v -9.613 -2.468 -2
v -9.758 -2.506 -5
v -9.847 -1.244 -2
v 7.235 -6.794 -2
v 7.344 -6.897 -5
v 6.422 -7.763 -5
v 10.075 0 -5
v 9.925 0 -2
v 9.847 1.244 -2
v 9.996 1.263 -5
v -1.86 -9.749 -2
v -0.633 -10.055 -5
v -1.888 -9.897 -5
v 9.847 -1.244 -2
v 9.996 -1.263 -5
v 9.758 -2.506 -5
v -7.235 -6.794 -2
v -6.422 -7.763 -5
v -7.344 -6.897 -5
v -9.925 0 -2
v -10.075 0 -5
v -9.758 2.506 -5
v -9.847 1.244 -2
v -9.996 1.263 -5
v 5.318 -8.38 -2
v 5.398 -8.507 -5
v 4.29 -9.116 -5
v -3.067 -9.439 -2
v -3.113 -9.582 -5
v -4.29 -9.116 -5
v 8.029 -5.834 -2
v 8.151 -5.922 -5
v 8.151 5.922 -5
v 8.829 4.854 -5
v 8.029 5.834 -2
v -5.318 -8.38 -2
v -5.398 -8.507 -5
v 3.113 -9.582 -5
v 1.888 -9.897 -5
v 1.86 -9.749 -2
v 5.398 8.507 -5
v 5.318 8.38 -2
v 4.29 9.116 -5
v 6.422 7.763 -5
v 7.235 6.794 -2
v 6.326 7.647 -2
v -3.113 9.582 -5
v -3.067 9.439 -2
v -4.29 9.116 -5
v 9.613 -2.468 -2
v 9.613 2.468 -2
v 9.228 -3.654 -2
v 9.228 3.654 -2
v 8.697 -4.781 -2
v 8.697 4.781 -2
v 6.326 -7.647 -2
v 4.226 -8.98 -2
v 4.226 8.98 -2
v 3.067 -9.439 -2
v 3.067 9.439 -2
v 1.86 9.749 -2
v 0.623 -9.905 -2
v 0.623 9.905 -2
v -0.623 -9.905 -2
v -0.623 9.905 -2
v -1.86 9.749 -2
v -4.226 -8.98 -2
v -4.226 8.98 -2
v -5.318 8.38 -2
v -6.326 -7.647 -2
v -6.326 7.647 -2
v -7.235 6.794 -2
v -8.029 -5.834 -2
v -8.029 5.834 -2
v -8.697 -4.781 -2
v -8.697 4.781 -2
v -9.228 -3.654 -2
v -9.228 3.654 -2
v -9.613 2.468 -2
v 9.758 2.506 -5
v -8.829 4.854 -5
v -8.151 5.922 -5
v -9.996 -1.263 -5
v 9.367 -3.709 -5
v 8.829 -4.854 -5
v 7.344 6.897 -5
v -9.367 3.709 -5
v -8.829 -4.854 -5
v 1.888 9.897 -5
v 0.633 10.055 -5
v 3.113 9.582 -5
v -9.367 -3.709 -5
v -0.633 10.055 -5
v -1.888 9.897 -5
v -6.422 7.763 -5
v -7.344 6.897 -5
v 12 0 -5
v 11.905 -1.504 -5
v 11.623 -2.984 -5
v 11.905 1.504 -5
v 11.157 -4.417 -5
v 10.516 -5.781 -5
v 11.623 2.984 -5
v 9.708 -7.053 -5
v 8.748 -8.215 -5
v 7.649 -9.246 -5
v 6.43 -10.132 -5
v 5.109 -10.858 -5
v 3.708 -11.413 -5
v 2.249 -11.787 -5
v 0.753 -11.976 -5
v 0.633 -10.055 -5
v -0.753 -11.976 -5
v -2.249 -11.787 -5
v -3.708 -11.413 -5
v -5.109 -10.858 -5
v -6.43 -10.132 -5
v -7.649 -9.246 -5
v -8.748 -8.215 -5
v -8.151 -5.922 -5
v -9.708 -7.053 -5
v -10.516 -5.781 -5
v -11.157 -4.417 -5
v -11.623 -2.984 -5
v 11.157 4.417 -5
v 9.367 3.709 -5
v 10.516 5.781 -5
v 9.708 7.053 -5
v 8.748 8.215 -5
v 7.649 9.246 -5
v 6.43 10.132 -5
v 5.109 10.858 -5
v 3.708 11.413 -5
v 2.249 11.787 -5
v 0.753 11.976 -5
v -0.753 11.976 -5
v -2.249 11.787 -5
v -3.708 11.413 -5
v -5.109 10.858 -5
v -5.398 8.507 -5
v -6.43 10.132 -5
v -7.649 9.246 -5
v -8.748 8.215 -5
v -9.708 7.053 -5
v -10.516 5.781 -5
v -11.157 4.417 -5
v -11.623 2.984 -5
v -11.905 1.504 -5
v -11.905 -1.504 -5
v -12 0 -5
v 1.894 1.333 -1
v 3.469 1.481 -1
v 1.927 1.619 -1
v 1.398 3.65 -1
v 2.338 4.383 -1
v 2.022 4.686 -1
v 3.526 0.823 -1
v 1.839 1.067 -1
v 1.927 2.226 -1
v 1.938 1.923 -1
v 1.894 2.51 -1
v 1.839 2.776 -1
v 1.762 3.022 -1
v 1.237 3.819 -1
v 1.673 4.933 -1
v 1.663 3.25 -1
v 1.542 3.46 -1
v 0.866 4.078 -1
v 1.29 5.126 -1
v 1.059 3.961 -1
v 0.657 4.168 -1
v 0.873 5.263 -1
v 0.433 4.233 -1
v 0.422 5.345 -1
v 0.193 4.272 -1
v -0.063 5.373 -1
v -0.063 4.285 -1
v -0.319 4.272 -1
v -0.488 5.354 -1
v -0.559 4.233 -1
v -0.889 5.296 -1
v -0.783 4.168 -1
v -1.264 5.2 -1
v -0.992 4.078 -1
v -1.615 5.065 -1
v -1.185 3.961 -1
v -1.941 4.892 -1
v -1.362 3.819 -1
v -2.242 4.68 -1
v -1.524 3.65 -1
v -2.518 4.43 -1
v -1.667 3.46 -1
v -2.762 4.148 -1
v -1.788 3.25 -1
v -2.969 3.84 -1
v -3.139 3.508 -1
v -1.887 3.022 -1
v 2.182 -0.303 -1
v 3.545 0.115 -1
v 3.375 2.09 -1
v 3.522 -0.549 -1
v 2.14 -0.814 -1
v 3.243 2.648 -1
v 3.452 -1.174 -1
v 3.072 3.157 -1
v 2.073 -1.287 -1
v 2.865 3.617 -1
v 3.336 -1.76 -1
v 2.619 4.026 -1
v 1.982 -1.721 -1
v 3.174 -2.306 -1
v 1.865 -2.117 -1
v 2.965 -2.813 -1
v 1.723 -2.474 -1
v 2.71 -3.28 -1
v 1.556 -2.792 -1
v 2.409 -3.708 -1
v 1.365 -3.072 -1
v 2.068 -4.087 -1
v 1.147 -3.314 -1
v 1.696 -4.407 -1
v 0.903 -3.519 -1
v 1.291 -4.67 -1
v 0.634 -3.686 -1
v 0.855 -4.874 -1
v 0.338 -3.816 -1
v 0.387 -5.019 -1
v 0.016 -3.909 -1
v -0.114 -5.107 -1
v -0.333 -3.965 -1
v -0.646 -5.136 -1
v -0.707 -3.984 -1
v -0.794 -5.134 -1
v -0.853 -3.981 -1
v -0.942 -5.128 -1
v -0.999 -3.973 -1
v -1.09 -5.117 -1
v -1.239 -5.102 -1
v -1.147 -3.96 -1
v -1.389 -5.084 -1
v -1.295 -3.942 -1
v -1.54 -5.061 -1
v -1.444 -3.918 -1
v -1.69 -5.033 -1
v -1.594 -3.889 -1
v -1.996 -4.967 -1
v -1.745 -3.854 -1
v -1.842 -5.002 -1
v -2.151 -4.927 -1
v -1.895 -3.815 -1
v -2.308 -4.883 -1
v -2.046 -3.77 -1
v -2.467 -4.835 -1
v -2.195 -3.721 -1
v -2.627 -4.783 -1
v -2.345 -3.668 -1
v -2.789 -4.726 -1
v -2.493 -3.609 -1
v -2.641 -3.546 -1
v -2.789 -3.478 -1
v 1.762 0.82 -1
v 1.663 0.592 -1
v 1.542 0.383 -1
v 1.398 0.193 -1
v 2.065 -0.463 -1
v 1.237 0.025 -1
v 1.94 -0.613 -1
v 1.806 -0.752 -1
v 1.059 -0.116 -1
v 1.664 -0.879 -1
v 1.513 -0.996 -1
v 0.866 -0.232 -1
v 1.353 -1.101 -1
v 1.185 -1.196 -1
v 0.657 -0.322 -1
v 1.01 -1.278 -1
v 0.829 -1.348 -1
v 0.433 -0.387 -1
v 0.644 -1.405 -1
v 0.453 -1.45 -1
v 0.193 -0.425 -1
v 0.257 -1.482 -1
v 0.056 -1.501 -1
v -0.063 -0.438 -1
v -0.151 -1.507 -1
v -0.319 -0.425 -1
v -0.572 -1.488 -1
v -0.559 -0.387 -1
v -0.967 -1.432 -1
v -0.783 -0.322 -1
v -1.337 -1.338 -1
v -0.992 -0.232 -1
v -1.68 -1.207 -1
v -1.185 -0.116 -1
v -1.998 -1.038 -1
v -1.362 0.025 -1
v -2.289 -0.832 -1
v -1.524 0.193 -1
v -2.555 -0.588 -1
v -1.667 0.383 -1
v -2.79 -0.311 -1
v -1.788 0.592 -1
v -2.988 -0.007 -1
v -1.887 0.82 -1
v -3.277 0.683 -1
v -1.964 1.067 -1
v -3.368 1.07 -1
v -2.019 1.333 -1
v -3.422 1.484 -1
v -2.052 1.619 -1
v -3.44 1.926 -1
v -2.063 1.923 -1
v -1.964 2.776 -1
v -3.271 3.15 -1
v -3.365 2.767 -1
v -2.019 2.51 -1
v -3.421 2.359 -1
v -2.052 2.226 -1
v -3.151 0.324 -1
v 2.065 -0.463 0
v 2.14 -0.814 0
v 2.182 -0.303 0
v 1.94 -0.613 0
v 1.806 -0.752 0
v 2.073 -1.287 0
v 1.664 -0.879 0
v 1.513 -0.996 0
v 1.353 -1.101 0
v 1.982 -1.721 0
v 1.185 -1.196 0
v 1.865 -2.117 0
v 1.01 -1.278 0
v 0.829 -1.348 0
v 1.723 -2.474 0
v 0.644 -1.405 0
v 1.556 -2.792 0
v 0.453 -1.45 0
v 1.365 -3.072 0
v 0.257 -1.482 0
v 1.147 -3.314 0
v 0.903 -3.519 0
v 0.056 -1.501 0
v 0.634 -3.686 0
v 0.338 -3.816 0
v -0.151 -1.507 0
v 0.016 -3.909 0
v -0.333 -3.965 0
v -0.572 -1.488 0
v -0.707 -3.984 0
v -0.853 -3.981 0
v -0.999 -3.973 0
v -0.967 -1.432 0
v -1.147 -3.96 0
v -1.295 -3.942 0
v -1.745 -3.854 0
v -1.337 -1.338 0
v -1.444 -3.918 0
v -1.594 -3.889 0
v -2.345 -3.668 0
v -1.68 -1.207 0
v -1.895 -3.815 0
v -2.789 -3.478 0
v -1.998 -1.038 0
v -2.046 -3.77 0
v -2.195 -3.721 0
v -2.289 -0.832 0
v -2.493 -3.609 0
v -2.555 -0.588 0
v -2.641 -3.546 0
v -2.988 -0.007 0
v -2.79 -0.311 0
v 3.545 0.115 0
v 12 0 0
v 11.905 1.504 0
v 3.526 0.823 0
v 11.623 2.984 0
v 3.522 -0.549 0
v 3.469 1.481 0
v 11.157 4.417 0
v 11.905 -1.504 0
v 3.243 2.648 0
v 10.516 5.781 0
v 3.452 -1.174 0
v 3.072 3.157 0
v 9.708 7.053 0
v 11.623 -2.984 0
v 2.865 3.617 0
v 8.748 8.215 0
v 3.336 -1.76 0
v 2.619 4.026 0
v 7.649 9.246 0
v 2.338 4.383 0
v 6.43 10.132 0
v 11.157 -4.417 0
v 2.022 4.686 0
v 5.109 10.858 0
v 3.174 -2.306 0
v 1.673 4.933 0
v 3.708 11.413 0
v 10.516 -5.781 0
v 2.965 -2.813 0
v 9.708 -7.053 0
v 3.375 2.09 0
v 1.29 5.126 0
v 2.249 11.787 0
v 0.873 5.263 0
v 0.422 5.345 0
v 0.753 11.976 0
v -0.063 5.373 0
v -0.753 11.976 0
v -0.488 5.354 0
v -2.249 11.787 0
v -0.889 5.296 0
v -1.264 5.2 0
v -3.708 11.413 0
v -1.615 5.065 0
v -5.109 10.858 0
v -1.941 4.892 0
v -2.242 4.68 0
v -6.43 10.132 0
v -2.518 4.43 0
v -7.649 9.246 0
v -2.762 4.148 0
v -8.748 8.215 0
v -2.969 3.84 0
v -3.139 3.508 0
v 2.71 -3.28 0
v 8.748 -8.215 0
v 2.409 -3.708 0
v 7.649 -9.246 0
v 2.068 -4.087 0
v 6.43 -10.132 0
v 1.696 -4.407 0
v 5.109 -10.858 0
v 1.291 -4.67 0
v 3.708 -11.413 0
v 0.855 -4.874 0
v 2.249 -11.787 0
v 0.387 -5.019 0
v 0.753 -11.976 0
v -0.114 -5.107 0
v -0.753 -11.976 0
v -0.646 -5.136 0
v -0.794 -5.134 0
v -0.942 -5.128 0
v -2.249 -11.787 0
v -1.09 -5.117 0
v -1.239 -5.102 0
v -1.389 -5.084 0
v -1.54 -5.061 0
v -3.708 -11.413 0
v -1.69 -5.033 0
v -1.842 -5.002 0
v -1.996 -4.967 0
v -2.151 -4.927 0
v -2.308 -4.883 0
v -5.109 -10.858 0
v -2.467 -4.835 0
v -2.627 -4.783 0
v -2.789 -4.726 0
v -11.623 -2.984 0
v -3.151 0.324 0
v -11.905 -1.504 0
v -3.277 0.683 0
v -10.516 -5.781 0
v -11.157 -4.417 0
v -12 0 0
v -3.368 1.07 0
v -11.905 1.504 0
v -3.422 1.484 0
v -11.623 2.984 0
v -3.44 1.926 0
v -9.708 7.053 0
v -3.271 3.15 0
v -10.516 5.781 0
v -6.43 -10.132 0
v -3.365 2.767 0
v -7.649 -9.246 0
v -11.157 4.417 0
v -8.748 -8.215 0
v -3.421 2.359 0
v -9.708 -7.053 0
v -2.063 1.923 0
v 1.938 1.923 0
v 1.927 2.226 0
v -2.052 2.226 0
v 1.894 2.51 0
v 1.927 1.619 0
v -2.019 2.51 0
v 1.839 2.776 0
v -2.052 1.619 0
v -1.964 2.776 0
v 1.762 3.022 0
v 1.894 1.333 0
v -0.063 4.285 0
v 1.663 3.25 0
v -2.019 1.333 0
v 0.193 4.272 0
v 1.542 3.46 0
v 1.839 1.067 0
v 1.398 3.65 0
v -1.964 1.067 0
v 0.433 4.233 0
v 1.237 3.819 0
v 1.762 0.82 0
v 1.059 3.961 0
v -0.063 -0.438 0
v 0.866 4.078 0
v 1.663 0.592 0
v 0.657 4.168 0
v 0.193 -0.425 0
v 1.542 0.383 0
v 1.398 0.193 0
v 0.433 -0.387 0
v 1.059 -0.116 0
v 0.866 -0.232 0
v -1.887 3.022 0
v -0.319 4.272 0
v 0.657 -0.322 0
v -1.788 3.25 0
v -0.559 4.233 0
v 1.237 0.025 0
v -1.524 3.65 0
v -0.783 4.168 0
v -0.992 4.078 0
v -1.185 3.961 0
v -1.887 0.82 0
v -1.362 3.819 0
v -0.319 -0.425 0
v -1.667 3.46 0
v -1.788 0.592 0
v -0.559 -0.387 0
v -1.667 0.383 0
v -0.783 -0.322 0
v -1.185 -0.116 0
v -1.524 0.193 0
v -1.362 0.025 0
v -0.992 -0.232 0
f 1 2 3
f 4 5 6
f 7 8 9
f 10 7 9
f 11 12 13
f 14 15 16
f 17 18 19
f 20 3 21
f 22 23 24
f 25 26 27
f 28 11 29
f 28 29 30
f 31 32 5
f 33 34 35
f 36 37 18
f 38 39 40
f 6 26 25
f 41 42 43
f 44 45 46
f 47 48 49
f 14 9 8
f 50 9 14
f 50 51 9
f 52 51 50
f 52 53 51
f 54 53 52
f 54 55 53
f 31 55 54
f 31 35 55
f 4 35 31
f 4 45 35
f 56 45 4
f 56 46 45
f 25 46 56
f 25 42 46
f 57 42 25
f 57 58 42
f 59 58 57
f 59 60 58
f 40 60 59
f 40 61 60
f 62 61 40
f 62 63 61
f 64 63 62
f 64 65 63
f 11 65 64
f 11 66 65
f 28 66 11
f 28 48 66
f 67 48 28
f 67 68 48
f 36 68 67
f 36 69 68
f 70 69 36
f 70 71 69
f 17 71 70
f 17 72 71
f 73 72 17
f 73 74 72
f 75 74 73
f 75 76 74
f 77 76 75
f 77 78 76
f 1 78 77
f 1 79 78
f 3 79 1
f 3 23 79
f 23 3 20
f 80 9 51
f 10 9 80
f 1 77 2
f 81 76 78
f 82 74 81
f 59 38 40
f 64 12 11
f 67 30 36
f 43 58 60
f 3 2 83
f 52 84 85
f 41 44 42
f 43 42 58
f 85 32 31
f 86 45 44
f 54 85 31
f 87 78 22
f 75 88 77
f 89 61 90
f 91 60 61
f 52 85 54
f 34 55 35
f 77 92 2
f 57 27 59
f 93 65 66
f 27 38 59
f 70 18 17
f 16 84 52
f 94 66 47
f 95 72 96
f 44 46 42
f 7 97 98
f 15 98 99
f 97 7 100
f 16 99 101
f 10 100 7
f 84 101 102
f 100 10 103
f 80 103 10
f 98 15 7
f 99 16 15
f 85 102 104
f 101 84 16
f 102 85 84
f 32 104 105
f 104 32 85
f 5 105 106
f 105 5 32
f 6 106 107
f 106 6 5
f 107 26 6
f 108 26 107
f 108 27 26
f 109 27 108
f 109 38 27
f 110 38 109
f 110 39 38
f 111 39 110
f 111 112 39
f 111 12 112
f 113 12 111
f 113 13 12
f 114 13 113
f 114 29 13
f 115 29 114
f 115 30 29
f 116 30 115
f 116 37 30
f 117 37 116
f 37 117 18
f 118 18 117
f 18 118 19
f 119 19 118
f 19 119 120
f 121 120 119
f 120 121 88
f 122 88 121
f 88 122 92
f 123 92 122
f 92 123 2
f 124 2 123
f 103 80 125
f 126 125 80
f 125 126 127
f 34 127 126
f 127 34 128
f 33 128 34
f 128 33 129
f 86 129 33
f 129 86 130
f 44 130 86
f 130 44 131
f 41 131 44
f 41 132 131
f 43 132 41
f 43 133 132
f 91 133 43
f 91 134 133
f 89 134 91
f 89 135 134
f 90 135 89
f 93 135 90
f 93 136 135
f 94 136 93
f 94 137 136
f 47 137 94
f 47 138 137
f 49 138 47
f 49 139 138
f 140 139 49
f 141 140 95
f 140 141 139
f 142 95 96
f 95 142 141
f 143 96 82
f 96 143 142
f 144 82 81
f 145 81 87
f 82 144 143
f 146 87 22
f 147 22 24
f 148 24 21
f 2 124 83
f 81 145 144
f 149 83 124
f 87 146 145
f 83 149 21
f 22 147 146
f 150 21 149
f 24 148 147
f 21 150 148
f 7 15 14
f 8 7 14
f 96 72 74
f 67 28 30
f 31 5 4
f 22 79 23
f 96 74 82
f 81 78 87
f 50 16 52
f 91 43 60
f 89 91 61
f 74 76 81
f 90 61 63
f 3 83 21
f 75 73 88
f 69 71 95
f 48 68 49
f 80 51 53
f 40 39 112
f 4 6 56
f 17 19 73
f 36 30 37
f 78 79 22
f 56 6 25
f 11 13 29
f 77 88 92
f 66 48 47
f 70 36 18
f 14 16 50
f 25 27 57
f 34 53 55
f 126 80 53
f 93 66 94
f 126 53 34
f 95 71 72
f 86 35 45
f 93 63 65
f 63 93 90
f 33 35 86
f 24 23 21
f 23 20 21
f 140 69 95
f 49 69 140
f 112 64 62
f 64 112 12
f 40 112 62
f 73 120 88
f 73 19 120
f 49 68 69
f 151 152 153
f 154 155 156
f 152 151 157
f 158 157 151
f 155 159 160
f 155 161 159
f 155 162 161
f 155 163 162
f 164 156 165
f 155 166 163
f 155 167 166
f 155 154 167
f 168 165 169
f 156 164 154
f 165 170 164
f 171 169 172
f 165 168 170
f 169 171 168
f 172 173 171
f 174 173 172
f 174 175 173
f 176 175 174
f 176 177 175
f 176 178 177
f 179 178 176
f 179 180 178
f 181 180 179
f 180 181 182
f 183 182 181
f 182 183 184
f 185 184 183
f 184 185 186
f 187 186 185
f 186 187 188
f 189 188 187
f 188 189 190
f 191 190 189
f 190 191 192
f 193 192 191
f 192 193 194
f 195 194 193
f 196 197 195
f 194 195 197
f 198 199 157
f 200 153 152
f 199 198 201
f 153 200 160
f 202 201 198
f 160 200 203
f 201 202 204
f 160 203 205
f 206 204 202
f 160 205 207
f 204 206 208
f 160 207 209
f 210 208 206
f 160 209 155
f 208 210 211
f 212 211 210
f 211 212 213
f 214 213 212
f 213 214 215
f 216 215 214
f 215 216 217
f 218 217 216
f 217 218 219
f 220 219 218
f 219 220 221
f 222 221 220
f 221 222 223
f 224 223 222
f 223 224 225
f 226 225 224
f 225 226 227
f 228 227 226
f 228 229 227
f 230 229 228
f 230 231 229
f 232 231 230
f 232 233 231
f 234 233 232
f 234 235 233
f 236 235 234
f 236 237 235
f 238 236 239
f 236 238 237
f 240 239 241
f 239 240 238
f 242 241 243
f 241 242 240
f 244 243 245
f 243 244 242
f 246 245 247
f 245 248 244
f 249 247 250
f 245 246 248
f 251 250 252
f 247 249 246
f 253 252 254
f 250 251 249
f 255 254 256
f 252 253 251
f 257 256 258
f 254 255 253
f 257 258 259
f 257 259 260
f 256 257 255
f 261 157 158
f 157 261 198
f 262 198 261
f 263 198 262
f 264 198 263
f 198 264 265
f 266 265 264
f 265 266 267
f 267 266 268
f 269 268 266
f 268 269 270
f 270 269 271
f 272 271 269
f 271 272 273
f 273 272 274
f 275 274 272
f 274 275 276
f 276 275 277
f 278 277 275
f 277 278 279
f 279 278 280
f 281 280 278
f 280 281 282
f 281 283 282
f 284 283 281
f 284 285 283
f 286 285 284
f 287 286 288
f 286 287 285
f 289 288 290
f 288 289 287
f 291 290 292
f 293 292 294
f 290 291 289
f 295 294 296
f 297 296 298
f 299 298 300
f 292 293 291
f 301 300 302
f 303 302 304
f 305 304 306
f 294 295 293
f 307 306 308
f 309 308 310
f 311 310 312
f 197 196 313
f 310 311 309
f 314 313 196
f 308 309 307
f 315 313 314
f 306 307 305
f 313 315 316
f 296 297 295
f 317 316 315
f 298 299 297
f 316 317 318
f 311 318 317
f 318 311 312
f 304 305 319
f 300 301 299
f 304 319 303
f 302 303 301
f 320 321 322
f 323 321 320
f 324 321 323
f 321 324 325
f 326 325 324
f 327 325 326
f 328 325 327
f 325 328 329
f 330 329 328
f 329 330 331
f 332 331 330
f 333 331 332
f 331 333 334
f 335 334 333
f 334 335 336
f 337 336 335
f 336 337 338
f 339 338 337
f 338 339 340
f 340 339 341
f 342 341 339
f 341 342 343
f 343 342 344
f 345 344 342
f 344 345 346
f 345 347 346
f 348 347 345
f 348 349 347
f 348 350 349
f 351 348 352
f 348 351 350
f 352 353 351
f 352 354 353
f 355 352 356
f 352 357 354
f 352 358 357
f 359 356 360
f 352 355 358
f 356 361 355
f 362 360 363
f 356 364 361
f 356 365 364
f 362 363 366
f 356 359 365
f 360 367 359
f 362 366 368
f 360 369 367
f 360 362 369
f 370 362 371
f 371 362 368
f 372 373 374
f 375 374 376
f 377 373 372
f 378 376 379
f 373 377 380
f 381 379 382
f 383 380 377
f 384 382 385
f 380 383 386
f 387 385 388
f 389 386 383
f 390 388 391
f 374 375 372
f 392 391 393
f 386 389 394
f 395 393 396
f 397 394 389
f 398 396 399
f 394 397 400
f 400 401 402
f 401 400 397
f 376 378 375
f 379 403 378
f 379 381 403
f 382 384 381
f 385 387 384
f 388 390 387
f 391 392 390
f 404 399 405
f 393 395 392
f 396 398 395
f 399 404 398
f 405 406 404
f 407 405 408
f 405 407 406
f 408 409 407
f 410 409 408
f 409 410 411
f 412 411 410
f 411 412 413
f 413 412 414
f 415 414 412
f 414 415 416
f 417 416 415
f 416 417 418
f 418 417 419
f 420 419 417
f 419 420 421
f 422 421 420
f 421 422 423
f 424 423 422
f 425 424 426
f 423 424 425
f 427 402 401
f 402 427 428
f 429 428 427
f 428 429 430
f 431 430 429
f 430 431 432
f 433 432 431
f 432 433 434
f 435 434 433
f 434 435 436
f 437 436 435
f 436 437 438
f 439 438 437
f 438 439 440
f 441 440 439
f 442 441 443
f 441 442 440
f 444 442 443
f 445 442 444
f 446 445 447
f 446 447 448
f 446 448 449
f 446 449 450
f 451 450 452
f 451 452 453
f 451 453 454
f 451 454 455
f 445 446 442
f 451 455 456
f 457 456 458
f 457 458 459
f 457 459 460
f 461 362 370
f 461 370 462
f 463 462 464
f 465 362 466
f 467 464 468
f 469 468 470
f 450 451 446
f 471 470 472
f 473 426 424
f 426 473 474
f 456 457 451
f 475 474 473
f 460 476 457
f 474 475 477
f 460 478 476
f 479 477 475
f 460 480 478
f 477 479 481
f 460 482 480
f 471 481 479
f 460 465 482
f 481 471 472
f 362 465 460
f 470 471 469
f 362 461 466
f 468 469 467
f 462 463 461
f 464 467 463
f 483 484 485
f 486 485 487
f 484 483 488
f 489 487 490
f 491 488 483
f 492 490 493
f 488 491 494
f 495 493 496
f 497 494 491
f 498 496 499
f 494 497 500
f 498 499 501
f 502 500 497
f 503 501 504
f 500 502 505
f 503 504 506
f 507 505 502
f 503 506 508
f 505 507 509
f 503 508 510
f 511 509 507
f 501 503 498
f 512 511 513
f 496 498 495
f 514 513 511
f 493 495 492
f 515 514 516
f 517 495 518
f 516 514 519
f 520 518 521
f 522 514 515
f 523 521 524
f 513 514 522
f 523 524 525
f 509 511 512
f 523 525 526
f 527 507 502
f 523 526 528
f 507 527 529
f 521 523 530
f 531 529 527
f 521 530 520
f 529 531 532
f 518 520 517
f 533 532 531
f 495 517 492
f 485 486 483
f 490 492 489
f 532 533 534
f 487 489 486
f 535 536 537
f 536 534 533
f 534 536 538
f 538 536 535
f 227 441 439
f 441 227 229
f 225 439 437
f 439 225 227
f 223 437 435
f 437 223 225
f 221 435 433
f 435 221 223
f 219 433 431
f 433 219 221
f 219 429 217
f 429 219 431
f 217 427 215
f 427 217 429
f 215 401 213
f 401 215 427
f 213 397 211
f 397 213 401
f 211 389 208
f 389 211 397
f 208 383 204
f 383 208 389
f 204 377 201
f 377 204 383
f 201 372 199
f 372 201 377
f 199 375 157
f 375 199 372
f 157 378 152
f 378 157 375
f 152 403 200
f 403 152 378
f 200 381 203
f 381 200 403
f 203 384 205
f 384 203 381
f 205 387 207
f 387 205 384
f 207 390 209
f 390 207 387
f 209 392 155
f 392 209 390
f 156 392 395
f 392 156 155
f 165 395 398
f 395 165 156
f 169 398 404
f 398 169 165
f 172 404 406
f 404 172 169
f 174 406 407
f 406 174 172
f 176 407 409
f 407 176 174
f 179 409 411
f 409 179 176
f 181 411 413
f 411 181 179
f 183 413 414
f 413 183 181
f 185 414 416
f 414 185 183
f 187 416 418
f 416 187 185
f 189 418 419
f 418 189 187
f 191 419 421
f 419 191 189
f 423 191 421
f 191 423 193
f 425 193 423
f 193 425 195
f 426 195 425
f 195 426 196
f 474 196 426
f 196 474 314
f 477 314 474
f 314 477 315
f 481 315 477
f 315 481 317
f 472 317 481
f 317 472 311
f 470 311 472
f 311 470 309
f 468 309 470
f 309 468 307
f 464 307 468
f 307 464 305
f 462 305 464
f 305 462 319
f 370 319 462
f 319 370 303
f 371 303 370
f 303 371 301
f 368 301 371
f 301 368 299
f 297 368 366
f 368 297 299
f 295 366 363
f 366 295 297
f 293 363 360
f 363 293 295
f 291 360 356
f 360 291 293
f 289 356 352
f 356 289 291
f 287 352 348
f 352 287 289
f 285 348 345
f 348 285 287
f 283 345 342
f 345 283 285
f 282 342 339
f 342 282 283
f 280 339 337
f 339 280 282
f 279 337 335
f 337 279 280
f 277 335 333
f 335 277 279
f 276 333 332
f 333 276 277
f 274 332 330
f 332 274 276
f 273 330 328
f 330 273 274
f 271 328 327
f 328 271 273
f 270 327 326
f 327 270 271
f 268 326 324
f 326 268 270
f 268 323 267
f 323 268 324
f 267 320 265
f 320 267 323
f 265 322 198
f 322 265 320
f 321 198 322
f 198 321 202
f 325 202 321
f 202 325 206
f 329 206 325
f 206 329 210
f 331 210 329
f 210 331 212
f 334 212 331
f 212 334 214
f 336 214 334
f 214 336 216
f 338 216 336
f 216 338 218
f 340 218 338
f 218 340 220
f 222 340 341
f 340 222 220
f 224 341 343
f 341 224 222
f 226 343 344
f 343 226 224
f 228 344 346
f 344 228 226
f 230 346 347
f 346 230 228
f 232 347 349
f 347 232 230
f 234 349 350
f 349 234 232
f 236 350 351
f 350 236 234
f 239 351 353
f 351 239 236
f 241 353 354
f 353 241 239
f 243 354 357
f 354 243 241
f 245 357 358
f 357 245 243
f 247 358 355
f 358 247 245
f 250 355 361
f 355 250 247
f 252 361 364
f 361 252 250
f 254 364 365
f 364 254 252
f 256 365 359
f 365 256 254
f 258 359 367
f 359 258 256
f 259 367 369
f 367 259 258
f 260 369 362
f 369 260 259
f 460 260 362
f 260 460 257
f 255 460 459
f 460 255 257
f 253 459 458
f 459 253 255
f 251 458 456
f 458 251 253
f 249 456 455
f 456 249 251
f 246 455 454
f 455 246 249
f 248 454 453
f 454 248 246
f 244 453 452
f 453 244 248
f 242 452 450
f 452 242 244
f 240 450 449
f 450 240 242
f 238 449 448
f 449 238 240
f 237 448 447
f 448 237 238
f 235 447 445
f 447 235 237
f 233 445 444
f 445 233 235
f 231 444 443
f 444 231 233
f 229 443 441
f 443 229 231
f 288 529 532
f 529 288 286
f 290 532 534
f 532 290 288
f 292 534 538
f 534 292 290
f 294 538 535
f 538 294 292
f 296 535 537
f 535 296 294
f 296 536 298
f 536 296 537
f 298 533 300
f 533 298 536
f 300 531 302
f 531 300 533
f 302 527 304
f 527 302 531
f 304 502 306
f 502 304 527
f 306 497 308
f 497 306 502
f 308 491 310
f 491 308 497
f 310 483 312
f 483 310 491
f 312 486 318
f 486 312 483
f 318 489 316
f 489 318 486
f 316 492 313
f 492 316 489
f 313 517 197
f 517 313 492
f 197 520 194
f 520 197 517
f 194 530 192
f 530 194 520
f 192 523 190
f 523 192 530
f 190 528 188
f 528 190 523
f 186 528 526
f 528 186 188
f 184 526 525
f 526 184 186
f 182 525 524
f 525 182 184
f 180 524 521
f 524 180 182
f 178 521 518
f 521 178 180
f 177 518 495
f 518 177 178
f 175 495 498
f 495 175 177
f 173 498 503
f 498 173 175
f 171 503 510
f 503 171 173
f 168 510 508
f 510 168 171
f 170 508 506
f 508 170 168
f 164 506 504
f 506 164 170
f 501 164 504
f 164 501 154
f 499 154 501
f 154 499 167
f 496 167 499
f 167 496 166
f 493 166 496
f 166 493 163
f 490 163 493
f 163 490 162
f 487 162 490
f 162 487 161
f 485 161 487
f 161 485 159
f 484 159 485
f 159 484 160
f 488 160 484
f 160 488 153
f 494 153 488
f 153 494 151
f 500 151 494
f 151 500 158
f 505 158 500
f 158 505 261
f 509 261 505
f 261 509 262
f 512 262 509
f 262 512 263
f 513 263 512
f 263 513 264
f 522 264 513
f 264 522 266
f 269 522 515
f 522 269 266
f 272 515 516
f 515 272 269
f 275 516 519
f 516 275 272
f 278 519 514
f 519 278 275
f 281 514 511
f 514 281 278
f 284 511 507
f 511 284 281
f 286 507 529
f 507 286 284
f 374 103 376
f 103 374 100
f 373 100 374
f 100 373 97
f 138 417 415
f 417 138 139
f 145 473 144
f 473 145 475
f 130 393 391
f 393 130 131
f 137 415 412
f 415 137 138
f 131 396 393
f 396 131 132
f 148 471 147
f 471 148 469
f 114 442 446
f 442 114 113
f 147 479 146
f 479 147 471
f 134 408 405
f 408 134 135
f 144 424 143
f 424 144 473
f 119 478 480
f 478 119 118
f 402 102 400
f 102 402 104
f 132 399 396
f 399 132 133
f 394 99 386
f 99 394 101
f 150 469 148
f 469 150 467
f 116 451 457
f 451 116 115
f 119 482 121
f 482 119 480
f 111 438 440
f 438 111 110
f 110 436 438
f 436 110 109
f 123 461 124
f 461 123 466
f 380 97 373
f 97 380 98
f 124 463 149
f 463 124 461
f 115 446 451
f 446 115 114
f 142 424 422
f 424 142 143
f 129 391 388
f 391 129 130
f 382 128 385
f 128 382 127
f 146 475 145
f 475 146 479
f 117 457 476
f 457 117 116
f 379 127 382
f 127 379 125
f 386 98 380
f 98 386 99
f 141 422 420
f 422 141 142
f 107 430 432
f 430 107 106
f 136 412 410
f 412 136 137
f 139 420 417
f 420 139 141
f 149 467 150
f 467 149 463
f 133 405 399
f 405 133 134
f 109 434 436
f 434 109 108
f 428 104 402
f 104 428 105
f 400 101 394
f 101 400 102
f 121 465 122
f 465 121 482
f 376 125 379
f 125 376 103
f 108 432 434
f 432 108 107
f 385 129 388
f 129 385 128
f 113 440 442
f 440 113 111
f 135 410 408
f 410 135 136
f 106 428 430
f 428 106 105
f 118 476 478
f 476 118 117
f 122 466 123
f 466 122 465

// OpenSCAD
$fn = 50;

difference() {
	union() {
		translate(v = [0, 0, -5.0]) {
			cylinder(h = 5, r = 12.0);
		}
	}
	union() {
		#translate(v = [0, 0, -5.0]) {
			cylinder(h = 3, r1 = 10.075, r2 = 9.925);
		}
		translate(v = [0, 0, -1]) {
			linear_extrude(height = 1) {
				text(font = "Impact", halign = "center", size = 10, text = "9", valign = "center");
			}
		}
	}
}
